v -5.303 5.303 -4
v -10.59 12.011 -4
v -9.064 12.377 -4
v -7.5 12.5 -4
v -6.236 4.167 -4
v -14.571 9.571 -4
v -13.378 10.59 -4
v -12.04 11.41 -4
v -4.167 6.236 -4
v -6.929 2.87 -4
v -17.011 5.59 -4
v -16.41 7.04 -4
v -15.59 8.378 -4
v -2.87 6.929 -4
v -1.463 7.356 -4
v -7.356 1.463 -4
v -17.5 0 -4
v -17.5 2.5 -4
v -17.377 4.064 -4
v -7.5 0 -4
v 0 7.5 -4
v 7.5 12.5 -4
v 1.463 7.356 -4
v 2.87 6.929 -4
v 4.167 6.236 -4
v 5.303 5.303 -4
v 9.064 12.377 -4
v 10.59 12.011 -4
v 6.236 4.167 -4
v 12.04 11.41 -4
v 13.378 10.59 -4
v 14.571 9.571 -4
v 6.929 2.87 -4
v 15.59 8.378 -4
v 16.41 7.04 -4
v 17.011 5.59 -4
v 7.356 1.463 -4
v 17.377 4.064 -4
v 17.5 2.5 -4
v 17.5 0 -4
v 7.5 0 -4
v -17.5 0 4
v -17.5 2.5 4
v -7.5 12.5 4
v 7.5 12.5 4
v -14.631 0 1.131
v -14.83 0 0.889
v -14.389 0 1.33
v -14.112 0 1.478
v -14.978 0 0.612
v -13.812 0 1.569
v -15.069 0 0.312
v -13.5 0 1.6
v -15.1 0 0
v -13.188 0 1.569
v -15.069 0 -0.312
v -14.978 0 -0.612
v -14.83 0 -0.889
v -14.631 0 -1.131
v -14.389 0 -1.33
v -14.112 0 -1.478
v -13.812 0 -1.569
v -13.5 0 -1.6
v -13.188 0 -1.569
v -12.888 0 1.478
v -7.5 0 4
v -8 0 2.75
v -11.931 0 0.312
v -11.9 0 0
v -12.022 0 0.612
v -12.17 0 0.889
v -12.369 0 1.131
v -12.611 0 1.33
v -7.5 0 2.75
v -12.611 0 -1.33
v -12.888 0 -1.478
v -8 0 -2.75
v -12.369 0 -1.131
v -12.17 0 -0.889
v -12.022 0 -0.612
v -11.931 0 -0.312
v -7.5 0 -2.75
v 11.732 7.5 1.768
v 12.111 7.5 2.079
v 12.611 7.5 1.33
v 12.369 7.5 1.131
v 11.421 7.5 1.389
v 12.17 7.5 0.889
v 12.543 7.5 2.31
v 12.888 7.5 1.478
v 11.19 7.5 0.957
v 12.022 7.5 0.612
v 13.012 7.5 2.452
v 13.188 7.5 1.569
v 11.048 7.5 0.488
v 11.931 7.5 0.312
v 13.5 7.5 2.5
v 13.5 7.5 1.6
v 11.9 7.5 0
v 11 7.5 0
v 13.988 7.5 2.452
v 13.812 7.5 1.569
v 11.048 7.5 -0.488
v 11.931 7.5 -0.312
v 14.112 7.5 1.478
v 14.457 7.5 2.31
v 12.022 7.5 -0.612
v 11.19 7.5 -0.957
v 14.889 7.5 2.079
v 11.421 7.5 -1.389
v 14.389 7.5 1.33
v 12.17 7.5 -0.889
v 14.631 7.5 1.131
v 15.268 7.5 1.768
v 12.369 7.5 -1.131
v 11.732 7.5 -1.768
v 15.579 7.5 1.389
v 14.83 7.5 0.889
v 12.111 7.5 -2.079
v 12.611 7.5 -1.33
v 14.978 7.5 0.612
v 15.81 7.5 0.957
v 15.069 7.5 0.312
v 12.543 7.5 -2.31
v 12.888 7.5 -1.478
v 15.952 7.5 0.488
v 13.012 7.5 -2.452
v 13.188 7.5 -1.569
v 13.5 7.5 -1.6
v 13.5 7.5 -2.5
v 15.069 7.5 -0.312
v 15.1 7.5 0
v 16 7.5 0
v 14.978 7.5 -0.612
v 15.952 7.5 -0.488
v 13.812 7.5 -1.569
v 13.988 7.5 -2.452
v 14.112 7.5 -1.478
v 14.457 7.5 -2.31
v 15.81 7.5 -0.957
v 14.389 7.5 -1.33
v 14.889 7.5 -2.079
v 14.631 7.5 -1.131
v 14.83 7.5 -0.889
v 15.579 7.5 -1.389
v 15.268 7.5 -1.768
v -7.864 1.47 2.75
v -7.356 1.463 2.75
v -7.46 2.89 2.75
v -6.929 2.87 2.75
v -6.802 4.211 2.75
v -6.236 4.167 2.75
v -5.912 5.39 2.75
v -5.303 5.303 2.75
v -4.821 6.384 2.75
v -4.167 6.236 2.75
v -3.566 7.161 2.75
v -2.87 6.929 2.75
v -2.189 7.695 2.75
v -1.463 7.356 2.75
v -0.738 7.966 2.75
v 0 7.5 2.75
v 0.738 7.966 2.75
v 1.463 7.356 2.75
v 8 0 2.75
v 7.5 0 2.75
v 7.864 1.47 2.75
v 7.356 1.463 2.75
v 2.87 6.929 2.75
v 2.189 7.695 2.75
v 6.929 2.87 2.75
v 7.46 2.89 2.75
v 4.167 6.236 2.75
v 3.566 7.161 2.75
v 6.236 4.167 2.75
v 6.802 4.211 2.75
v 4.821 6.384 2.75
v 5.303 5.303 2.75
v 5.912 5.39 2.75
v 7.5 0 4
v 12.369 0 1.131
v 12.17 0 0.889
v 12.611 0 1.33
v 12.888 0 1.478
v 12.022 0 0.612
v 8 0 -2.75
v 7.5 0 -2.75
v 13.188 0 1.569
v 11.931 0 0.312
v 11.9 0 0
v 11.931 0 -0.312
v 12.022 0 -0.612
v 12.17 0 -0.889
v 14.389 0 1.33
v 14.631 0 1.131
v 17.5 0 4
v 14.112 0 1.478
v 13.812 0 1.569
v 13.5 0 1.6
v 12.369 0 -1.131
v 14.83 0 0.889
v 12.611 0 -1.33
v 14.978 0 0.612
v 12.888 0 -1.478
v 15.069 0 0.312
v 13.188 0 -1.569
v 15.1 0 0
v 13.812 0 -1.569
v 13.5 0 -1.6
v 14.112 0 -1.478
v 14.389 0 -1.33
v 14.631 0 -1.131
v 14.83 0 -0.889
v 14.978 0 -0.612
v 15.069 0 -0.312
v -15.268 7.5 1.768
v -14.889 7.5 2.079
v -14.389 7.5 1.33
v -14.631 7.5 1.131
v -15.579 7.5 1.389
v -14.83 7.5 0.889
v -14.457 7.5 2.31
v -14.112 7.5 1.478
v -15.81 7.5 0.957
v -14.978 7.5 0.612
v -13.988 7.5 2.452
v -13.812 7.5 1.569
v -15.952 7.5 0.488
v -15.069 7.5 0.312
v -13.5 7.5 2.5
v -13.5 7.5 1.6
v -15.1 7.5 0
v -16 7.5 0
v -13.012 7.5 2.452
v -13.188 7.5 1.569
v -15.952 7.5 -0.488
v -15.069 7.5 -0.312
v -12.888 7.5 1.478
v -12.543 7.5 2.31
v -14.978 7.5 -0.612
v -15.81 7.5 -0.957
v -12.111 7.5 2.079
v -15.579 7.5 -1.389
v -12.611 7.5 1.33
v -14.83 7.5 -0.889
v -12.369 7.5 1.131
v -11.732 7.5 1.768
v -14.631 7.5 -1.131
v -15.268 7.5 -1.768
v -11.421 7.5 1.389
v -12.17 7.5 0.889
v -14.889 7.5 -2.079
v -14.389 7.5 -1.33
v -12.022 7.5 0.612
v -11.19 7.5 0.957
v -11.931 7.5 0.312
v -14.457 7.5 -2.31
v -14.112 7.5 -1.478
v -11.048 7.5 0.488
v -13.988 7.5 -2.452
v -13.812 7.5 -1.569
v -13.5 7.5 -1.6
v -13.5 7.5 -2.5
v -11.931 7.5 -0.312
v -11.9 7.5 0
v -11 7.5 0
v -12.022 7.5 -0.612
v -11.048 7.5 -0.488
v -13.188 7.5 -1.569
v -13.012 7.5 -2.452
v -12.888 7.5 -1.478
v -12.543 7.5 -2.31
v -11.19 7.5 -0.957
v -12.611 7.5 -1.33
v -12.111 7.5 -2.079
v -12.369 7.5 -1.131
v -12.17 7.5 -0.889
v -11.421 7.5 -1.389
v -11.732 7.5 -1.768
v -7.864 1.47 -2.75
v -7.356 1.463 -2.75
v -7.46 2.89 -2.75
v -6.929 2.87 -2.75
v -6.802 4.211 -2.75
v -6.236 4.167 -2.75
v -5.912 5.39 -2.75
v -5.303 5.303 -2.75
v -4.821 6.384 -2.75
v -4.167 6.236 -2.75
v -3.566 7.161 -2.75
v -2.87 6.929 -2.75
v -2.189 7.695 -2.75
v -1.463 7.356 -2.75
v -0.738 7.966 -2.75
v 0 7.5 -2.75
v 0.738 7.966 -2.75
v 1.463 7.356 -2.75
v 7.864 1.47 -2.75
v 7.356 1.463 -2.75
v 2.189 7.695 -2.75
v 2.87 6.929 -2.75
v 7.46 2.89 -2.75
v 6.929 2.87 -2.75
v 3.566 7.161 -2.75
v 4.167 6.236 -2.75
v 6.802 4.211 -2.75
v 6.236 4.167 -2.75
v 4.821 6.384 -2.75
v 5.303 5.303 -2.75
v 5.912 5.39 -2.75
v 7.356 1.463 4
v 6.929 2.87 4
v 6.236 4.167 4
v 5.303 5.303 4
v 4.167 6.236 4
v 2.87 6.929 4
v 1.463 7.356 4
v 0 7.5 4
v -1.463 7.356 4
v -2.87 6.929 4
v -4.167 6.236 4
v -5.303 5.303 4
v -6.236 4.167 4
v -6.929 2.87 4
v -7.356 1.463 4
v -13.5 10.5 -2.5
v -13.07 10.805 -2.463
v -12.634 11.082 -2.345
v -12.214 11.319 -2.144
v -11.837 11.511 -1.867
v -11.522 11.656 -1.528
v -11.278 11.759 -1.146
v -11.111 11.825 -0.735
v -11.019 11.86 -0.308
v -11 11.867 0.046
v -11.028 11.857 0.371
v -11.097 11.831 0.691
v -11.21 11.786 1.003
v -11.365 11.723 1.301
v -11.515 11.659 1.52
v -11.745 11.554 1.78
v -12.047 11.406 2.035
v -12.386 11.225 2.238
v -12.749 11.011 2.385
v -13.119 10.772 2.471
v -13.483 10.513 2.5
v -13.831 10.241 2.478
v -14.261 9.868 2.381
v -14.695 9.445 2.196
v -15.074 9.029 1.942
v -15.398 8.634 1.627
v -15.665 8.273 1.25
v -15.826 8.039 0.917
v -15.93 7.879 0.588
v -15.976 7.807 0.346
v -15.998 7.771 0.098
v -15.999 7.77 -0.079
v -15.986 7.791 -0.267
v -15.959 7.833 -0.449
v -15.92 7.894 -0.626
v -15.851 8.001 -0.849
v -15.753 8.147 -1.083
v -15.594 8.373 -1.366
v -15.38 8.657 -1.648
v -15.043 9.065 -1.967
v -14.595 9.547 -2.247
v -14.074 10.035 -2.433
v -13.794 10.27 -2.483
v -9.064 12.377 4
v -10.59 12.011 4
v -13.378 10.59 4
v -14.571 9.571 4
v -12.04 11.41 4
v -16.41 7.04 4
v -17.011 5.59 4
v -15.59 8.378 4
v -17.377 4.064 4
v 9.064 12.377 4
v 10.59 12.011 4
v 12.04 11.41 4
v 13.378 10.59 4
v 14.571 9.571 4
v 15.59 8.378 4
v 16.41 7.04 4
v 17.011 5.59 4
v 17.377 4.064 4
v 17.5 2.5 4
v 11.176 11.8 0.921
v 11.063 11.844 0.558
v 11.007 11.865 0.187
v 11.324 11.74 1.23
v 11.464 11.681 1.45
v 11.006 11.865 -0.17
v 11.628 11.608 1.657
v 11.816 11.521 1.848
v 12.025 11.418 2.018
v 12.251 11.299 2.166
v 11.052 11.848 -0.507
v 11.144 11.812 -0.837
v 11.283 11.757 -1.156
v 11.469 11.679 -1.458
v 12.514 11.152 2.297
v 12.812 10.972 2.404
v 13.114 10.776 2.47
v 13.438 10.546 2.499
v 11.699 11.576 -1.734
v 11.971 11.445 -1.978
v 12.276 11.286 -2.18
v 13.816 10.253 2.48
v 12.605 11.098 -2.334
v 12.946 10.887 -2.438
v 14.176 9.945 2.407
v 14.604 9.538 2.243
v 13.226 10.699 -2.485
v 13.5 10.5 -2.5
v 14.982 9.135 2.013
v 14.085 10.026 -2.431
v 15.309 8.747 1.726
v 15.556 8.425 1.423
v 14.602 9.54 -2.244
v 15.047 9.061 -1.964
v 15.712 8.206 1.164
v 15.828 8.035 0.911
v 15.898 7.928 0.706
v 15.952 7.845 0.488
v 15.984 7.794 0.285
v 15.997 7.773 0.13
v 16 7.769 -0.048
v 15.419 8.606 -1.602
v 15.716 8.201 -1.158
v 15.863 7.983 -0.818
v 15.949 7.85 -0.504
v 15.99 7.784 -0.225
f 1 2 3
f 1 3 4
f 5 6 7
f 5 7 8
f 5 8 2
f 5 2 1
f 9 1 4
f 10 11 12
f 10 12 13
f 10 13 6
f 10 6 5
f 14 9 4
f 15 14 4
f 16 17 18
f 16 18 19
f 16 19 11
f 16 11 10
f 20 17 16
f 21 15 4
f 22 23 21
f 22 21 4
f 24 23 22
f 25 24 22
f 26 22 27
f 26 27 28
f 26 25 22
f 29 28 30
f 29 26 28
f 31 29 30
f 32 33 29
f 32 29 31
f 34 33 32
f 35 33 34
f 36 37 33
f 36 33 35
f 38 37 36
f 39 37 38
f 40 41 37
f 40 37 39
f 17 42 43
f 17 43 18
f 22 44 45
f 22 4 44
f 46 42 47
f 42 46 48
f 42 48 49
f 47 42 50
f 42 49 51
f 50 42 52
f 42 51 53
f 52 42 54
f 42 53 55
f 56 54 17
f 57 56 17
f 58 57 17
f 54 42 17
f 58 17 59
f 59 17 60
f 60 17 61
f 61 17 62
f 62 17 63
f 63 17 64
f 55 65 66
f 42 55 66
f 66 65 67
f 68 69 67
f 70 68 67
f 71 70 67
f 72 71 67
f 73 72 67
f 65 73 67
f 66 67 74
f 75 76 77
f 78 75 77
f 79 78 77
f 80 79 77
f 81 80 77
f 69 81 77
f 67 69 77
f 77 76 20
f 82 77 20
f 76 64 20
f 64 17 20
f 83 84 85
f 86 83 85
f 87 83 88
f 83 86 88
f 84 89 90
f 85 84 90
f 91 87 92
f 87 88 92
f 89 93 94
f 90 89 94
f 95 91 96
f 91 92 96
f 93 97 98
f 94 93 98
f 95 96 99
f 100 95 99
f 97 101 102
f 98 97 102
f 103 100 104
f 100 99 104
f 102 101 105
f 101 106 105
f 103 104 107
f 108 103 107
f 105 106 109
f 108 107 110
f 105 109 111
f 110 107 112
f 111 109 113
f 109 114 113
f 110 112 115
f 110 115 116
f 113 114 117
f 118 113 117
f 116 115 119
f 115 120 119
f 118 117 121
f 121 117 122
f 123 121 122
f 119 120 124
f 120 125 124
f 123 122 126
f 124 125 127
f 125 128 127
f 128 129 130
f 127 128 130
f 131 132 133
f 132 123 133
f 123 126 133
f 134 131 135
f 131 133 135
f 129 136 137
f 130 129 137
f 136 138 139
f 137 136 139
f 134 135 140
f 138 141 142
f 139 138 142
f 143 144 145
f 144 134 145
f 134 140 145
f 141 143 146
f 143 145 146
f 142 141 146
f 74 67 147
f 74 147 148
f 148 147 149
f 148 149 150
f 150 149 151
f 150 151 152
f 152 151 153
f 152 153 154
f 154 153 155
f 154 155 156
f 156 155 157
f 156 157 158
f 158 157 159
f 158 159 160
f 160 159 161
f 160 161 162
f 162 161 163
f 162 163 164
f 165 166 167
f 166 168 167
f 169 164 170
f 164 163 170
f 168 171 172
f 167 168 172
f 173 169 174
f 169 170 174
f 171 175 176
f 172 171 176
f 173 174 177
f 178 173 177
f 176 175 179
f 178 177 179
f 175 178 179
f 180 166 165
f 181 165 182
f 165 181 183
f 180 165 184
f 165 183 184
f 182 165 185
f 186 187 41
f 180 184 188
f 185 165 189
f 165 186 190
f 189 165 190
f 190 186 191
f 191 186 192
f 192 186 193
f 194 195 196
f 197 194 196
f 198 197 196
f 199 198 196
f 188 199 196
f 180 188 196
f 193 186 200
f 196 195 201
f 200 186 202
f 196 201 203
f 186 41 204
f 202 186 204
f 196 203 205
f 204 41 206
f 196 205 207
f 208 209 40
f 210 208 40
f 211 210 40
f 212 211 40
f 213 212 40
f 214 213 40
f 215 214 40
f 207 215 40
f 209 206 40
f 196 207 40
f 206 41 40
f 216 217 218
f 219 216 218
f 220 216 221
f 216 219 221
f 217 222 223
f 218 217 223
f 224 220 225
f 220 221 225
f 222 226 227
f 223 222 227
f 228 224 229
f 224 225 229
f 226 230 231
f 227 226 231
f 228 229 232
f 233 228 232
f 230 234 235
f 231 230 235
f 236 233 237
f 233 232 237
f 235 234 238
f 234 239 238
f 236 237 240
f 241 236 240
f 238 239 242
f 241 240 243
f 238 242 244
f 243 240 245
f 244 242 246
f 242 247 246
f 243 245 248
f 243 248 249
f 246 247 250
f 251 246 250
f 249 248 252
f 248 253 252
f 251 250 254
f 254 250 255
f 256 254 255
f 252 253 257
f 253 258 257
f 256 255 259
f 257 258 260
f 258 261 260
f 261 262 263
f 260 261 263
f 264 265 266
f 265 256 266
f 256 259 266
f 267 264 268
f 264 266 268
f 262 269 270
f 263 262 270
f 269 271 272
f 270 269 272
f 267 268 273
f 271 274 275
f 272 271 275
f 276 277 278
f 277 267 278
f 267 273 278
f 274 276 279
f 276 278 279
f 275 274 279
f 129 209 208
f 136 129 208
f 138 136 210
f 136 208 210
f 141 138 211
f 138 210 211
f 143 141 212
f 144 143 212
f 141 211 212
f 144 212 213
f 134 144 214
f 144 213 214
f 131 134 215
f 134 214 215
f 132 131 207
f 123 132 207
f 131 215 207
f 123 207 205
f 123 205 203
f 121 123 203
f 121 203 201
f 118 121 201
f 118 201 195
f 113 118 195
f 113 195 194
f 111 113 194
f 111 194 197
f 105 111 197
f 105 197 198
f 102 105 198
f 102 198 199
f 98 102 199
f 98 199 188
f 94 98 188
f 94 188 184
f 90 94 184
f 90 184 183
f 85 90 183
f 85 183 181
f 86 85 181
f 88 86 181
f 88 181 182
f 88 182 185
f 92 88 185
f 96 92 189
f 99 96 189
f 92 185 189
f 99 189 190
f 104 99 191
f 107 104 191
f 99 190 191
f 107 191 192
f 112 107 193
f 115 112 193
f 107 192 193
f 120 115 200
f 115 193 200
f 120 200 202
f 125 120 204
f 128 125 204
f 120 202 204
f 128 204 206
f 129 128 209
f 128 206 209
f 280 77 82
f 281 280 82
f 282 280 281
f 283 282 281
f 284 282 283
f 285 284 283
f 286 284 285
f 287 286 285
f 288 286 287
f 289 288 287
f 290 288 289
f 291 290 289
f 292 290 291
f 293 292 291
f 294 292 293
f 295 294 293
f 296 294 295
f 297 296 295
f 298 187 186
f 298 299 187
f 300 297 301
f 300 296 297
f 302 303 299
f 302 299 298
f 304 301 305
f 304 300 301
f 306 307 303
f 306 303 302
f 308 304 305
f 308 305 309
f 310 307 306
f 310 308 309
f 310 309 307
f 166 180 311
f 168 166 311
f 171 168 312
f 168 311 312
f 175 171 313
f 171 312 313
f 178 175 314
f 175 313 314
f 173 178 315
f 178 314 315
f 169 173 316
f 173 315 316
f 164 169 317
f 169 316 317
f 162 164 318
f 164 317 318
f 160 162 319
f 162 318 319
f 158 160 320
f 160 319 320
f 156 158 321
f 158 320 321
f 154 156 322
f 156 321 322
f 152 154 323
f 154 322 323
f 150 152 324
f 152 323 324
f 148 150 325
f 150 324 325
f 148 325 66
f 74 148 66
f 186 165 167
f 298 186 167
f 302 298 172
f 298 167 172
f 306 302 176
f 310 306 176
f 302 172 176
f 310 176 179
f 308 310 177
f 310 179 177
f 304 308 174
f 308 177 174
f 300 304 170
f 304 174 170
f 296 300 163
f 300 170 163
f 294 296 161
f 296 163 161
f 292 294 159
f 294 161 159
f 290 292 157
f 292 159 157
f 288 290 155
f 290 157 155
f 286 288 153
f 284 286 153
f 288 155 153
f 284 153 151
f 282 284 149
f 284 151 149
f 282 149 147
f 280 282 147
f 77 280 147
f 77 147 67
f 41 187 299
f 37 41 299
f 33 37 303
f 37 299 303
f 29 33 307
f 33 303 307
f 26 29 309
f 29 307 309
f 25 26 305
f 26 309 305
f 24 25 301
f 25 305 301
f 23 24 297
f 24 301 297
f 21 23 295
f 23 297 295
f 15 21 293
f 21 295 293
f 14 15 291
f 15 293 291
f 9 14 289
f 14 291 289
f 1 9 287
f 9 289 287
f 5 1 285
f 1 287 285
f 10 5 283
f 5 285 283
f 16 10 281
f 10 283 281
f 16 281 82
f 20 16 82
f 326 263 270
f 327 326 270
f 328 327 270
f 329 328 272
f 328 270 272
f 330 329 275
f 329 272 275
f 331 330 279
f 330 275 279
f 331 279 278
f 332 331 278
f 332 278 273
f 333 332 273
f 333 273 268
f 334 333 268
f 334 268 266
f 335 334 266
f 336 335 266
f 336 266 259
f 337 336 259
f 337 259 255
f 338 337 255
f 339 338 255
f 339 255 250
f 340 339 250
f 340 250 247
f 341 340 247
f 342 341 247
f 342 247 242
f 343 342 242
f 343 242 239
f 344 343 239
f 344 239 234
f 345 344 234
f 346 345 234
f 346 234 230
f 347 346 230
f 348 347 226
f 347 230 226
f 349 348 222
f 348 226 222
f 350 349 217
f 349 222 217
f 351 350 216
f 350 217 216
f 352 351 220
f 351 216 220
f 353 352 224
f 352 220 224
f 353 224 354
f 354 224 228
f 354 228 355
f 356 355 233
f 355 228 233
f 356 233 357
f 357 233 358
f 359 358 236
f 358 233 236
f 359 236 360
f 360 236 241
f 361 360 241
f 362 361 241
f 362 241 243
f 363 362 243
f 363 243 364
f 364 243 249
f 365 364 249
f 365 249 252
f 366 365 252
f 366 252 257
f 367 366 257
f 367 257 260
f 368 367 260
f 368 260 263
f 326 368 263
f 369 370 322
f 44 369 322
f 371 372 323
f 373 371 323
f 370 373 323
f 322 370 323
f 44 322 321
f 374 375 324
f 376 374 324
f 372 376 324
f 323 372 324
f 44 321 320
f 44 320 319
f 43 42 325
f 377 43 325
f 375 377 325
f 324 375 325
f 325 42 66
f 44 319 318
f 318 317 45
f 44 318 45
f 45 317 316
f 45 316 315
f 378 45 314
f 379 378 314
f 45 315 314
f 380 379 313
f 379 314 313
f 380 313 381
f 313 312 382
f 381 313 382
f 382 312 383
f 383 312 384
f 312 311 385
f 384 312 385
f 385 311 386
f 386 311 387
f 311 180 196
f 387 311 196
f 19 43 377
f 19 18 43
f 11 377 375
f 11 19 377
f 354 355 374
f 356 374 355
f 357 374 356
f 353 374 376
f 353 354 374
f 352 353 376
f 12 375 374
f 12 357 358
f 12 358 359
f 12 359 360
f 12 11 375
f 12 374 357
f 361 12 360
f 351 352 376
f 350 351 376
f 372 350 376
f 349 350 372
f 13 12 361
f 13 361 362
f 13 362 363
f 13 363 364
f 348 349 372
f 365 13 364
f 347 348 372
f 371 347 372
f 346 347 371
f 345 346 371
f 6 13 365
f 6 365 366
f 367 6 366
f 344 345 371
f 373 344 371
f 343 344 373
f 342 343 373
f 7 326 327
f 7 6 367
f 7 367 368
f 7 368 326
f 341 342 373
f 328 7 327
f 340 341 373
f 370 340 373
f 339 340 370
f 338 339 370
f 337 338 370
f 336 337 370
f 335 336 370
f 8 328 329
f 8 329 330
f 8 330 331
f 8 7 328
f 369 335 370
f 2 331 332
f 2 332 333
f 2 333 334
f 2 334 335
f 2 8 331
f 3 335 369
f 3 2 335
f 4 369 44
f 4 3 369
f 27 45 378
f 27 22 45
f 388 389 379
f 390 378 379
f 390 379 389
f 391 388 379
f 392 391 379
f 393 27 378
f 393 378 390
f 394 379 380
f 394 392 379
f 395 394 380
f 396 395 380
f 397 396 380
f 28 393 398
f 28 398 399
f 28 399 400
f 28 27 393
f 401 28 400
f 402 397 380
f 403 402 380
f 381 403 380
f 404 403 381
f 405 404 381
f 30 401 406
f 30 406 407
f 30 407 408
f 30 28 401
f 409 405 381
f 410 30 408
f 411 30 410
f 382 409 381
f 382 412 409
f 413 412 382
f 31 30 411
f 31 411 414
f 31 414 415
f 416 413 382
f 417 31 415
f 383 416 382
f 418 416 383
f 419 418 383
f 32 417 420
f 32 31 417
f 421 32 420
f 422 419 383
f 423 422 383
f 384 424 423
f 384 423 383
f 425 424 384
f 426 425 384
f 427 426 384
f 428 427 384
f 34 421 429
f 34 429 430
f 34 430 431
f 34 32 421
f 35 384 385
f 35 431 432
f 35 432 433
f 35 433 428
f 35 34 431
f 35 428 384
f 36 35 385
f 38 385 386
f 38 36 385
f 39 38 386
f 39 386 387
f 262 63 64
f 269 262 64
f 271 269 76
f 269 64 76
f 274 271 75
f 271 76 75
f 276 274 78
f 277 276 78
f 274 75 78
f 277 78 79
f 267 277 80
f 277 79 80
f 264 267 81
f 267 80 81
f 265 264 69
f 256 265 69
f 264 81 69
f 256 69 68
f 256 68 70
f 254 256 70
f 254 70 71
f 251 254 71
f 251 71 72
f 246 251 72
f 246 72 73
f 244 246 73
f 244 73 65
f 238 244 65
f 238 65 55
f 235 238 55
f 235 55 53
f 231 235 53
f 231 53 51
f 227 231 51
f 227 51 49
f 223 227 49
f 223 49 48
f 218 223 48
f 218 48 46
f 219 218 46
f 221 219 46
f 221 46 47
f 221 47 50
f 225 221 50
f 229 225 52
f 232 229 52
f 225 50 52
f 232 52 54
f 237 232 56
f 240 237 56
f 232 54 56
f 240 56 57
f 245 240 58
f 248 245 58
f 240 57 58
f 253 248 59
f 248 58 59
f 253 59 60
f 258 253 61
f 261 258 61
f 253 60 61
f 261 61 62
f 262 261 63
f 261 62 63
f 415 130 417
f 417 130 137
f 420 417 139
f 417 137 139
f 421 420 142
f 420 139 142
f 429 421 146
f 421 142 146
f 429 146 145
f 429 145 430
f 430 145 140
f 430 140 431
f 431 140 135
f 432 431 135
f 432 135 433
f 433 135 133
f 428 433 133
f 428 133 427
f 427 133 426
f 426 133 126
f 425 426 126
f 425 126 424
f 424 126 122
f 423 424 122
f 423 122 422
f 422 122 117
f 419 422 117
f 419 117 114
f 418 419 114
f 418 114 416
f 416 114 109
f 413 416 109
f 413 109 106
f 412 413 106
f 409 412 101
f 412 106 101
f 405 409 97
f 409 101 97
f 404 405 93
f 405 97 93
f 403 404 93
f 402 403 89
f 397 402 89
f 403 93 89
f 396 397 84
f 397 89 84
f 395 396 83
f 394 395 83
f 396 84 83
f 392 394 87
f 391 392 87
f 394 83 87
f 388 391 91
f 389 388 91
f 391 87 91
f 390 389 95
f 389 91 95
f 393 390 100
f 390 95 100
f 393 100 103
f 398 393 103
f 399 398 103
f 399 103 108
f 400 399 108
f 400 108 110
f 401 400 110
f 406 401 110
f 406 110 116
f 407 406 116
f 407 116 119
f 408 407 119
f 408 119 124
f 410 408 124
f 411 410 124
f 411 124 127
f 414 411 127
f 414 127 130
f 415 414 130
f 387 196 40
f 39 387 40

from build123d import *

# Parameters (mm, degrees)
SKETCH1_W           = 35
SKETCH1_H           = 8
BOSS_EXTRUDE1_DEPTH = 12.5
CUT_EXTRUDE1_REACH  = 24.946
SKETCH2_R           = 7.5
FILLET1_R           = 10
SKETCH3_R           = 8
CUT_EXTRUDE2_DEPTH  = 2.75
SKETCH4_R           = 1.6
CUT_EXTRUDE3_DEPTH  = 22.874642854
SKETCH5_R           = 2.5
CUT_EXTRUDE4_DEPTH  = 20.455076607


with BuildPart() as part:
    # Sketch1 → Boss-Extrude1 (new body)
    with BuildSketch(Plane(origin=(0, 0, 0), x_dir=(1, 0, 0), z_dir=(0, 1, 0))):
        Rectangle(SKETCH1_W, SKETCH1_H)
    extrude(amount=BOSS_EXTRUDE1_DEPTH)

    # Sketch2 → Cut-Extrude1 (cut, up to next)
    with BuildSketch(Plane.XY.offset(4), mode=Mode.PRIVATE) as cut_extrude1_sk1:
        Circle(SKETCH2_R)
    cut_extrude1_tool1 = extrude(cut_extrude1_sk1.sketch, amount=-CUT_EXTRUDE1_REACH, mode=Mode.PRIVATE) & part.part
    add(cut_extrude1_tool1.solids().sort_by_distance((0, 0, 4))[0], mode=Mode.SUBTRACT)

    # Fillet1
    fillet1_edges = [part.edges().sort_by_distance(p)[0] for p in [
        (-17.5, 12.5, 0),
        (17.5, 12.5, 0),
    ]]
    fillet(fillet1_edges, radius=FILLET1_R)

    # Sketch3 → Cut-Extrude2 (cut, symmetric)
    with BuildSketch(Plane.XY):
        Circle(SKETCH3_R)
    extrude(amount=CUT_EXTRUDE2_DEPTH, both=True, mode=Mode.SUBTRACT)

    # Sketch4 → Cut-Extrude3 (cut, through all)
    with BuildSketch(Plane.XZ):
        with Locations(Location((13.5, 0, 0), (0, 0, 270))):
            Circle(SKETCH4_R)
        with Locations(Location((-13.5, 0, 0), (0, 0, 270))):
            Circle(SKETCH4_R)
    extrude(amount=-CUT_EXTRUDE3_DEPTH, mode=Mode.SUBTRACT)

    # Sketch5 → Cut-Extrude4 (cut, through all)
    with BuildSketch(Plane(origin=(0, 7.5, 0), x_dir=(-1, 0, 0), z_dir=(0, -1, 0))):
        with Locations(Location((-13.5, 0, 0), (0, 0, 90))):
            Circle(SKETCH5_R)
        with Locations(Location((13.5, 0, 0), (0, 0, 90))):
            Circle(SKETCH5_R)
    extrude(amount=-CUT_EXTRUDE4_DEPTH, mode=Mode.SUBTRACT)


solid = part.part
